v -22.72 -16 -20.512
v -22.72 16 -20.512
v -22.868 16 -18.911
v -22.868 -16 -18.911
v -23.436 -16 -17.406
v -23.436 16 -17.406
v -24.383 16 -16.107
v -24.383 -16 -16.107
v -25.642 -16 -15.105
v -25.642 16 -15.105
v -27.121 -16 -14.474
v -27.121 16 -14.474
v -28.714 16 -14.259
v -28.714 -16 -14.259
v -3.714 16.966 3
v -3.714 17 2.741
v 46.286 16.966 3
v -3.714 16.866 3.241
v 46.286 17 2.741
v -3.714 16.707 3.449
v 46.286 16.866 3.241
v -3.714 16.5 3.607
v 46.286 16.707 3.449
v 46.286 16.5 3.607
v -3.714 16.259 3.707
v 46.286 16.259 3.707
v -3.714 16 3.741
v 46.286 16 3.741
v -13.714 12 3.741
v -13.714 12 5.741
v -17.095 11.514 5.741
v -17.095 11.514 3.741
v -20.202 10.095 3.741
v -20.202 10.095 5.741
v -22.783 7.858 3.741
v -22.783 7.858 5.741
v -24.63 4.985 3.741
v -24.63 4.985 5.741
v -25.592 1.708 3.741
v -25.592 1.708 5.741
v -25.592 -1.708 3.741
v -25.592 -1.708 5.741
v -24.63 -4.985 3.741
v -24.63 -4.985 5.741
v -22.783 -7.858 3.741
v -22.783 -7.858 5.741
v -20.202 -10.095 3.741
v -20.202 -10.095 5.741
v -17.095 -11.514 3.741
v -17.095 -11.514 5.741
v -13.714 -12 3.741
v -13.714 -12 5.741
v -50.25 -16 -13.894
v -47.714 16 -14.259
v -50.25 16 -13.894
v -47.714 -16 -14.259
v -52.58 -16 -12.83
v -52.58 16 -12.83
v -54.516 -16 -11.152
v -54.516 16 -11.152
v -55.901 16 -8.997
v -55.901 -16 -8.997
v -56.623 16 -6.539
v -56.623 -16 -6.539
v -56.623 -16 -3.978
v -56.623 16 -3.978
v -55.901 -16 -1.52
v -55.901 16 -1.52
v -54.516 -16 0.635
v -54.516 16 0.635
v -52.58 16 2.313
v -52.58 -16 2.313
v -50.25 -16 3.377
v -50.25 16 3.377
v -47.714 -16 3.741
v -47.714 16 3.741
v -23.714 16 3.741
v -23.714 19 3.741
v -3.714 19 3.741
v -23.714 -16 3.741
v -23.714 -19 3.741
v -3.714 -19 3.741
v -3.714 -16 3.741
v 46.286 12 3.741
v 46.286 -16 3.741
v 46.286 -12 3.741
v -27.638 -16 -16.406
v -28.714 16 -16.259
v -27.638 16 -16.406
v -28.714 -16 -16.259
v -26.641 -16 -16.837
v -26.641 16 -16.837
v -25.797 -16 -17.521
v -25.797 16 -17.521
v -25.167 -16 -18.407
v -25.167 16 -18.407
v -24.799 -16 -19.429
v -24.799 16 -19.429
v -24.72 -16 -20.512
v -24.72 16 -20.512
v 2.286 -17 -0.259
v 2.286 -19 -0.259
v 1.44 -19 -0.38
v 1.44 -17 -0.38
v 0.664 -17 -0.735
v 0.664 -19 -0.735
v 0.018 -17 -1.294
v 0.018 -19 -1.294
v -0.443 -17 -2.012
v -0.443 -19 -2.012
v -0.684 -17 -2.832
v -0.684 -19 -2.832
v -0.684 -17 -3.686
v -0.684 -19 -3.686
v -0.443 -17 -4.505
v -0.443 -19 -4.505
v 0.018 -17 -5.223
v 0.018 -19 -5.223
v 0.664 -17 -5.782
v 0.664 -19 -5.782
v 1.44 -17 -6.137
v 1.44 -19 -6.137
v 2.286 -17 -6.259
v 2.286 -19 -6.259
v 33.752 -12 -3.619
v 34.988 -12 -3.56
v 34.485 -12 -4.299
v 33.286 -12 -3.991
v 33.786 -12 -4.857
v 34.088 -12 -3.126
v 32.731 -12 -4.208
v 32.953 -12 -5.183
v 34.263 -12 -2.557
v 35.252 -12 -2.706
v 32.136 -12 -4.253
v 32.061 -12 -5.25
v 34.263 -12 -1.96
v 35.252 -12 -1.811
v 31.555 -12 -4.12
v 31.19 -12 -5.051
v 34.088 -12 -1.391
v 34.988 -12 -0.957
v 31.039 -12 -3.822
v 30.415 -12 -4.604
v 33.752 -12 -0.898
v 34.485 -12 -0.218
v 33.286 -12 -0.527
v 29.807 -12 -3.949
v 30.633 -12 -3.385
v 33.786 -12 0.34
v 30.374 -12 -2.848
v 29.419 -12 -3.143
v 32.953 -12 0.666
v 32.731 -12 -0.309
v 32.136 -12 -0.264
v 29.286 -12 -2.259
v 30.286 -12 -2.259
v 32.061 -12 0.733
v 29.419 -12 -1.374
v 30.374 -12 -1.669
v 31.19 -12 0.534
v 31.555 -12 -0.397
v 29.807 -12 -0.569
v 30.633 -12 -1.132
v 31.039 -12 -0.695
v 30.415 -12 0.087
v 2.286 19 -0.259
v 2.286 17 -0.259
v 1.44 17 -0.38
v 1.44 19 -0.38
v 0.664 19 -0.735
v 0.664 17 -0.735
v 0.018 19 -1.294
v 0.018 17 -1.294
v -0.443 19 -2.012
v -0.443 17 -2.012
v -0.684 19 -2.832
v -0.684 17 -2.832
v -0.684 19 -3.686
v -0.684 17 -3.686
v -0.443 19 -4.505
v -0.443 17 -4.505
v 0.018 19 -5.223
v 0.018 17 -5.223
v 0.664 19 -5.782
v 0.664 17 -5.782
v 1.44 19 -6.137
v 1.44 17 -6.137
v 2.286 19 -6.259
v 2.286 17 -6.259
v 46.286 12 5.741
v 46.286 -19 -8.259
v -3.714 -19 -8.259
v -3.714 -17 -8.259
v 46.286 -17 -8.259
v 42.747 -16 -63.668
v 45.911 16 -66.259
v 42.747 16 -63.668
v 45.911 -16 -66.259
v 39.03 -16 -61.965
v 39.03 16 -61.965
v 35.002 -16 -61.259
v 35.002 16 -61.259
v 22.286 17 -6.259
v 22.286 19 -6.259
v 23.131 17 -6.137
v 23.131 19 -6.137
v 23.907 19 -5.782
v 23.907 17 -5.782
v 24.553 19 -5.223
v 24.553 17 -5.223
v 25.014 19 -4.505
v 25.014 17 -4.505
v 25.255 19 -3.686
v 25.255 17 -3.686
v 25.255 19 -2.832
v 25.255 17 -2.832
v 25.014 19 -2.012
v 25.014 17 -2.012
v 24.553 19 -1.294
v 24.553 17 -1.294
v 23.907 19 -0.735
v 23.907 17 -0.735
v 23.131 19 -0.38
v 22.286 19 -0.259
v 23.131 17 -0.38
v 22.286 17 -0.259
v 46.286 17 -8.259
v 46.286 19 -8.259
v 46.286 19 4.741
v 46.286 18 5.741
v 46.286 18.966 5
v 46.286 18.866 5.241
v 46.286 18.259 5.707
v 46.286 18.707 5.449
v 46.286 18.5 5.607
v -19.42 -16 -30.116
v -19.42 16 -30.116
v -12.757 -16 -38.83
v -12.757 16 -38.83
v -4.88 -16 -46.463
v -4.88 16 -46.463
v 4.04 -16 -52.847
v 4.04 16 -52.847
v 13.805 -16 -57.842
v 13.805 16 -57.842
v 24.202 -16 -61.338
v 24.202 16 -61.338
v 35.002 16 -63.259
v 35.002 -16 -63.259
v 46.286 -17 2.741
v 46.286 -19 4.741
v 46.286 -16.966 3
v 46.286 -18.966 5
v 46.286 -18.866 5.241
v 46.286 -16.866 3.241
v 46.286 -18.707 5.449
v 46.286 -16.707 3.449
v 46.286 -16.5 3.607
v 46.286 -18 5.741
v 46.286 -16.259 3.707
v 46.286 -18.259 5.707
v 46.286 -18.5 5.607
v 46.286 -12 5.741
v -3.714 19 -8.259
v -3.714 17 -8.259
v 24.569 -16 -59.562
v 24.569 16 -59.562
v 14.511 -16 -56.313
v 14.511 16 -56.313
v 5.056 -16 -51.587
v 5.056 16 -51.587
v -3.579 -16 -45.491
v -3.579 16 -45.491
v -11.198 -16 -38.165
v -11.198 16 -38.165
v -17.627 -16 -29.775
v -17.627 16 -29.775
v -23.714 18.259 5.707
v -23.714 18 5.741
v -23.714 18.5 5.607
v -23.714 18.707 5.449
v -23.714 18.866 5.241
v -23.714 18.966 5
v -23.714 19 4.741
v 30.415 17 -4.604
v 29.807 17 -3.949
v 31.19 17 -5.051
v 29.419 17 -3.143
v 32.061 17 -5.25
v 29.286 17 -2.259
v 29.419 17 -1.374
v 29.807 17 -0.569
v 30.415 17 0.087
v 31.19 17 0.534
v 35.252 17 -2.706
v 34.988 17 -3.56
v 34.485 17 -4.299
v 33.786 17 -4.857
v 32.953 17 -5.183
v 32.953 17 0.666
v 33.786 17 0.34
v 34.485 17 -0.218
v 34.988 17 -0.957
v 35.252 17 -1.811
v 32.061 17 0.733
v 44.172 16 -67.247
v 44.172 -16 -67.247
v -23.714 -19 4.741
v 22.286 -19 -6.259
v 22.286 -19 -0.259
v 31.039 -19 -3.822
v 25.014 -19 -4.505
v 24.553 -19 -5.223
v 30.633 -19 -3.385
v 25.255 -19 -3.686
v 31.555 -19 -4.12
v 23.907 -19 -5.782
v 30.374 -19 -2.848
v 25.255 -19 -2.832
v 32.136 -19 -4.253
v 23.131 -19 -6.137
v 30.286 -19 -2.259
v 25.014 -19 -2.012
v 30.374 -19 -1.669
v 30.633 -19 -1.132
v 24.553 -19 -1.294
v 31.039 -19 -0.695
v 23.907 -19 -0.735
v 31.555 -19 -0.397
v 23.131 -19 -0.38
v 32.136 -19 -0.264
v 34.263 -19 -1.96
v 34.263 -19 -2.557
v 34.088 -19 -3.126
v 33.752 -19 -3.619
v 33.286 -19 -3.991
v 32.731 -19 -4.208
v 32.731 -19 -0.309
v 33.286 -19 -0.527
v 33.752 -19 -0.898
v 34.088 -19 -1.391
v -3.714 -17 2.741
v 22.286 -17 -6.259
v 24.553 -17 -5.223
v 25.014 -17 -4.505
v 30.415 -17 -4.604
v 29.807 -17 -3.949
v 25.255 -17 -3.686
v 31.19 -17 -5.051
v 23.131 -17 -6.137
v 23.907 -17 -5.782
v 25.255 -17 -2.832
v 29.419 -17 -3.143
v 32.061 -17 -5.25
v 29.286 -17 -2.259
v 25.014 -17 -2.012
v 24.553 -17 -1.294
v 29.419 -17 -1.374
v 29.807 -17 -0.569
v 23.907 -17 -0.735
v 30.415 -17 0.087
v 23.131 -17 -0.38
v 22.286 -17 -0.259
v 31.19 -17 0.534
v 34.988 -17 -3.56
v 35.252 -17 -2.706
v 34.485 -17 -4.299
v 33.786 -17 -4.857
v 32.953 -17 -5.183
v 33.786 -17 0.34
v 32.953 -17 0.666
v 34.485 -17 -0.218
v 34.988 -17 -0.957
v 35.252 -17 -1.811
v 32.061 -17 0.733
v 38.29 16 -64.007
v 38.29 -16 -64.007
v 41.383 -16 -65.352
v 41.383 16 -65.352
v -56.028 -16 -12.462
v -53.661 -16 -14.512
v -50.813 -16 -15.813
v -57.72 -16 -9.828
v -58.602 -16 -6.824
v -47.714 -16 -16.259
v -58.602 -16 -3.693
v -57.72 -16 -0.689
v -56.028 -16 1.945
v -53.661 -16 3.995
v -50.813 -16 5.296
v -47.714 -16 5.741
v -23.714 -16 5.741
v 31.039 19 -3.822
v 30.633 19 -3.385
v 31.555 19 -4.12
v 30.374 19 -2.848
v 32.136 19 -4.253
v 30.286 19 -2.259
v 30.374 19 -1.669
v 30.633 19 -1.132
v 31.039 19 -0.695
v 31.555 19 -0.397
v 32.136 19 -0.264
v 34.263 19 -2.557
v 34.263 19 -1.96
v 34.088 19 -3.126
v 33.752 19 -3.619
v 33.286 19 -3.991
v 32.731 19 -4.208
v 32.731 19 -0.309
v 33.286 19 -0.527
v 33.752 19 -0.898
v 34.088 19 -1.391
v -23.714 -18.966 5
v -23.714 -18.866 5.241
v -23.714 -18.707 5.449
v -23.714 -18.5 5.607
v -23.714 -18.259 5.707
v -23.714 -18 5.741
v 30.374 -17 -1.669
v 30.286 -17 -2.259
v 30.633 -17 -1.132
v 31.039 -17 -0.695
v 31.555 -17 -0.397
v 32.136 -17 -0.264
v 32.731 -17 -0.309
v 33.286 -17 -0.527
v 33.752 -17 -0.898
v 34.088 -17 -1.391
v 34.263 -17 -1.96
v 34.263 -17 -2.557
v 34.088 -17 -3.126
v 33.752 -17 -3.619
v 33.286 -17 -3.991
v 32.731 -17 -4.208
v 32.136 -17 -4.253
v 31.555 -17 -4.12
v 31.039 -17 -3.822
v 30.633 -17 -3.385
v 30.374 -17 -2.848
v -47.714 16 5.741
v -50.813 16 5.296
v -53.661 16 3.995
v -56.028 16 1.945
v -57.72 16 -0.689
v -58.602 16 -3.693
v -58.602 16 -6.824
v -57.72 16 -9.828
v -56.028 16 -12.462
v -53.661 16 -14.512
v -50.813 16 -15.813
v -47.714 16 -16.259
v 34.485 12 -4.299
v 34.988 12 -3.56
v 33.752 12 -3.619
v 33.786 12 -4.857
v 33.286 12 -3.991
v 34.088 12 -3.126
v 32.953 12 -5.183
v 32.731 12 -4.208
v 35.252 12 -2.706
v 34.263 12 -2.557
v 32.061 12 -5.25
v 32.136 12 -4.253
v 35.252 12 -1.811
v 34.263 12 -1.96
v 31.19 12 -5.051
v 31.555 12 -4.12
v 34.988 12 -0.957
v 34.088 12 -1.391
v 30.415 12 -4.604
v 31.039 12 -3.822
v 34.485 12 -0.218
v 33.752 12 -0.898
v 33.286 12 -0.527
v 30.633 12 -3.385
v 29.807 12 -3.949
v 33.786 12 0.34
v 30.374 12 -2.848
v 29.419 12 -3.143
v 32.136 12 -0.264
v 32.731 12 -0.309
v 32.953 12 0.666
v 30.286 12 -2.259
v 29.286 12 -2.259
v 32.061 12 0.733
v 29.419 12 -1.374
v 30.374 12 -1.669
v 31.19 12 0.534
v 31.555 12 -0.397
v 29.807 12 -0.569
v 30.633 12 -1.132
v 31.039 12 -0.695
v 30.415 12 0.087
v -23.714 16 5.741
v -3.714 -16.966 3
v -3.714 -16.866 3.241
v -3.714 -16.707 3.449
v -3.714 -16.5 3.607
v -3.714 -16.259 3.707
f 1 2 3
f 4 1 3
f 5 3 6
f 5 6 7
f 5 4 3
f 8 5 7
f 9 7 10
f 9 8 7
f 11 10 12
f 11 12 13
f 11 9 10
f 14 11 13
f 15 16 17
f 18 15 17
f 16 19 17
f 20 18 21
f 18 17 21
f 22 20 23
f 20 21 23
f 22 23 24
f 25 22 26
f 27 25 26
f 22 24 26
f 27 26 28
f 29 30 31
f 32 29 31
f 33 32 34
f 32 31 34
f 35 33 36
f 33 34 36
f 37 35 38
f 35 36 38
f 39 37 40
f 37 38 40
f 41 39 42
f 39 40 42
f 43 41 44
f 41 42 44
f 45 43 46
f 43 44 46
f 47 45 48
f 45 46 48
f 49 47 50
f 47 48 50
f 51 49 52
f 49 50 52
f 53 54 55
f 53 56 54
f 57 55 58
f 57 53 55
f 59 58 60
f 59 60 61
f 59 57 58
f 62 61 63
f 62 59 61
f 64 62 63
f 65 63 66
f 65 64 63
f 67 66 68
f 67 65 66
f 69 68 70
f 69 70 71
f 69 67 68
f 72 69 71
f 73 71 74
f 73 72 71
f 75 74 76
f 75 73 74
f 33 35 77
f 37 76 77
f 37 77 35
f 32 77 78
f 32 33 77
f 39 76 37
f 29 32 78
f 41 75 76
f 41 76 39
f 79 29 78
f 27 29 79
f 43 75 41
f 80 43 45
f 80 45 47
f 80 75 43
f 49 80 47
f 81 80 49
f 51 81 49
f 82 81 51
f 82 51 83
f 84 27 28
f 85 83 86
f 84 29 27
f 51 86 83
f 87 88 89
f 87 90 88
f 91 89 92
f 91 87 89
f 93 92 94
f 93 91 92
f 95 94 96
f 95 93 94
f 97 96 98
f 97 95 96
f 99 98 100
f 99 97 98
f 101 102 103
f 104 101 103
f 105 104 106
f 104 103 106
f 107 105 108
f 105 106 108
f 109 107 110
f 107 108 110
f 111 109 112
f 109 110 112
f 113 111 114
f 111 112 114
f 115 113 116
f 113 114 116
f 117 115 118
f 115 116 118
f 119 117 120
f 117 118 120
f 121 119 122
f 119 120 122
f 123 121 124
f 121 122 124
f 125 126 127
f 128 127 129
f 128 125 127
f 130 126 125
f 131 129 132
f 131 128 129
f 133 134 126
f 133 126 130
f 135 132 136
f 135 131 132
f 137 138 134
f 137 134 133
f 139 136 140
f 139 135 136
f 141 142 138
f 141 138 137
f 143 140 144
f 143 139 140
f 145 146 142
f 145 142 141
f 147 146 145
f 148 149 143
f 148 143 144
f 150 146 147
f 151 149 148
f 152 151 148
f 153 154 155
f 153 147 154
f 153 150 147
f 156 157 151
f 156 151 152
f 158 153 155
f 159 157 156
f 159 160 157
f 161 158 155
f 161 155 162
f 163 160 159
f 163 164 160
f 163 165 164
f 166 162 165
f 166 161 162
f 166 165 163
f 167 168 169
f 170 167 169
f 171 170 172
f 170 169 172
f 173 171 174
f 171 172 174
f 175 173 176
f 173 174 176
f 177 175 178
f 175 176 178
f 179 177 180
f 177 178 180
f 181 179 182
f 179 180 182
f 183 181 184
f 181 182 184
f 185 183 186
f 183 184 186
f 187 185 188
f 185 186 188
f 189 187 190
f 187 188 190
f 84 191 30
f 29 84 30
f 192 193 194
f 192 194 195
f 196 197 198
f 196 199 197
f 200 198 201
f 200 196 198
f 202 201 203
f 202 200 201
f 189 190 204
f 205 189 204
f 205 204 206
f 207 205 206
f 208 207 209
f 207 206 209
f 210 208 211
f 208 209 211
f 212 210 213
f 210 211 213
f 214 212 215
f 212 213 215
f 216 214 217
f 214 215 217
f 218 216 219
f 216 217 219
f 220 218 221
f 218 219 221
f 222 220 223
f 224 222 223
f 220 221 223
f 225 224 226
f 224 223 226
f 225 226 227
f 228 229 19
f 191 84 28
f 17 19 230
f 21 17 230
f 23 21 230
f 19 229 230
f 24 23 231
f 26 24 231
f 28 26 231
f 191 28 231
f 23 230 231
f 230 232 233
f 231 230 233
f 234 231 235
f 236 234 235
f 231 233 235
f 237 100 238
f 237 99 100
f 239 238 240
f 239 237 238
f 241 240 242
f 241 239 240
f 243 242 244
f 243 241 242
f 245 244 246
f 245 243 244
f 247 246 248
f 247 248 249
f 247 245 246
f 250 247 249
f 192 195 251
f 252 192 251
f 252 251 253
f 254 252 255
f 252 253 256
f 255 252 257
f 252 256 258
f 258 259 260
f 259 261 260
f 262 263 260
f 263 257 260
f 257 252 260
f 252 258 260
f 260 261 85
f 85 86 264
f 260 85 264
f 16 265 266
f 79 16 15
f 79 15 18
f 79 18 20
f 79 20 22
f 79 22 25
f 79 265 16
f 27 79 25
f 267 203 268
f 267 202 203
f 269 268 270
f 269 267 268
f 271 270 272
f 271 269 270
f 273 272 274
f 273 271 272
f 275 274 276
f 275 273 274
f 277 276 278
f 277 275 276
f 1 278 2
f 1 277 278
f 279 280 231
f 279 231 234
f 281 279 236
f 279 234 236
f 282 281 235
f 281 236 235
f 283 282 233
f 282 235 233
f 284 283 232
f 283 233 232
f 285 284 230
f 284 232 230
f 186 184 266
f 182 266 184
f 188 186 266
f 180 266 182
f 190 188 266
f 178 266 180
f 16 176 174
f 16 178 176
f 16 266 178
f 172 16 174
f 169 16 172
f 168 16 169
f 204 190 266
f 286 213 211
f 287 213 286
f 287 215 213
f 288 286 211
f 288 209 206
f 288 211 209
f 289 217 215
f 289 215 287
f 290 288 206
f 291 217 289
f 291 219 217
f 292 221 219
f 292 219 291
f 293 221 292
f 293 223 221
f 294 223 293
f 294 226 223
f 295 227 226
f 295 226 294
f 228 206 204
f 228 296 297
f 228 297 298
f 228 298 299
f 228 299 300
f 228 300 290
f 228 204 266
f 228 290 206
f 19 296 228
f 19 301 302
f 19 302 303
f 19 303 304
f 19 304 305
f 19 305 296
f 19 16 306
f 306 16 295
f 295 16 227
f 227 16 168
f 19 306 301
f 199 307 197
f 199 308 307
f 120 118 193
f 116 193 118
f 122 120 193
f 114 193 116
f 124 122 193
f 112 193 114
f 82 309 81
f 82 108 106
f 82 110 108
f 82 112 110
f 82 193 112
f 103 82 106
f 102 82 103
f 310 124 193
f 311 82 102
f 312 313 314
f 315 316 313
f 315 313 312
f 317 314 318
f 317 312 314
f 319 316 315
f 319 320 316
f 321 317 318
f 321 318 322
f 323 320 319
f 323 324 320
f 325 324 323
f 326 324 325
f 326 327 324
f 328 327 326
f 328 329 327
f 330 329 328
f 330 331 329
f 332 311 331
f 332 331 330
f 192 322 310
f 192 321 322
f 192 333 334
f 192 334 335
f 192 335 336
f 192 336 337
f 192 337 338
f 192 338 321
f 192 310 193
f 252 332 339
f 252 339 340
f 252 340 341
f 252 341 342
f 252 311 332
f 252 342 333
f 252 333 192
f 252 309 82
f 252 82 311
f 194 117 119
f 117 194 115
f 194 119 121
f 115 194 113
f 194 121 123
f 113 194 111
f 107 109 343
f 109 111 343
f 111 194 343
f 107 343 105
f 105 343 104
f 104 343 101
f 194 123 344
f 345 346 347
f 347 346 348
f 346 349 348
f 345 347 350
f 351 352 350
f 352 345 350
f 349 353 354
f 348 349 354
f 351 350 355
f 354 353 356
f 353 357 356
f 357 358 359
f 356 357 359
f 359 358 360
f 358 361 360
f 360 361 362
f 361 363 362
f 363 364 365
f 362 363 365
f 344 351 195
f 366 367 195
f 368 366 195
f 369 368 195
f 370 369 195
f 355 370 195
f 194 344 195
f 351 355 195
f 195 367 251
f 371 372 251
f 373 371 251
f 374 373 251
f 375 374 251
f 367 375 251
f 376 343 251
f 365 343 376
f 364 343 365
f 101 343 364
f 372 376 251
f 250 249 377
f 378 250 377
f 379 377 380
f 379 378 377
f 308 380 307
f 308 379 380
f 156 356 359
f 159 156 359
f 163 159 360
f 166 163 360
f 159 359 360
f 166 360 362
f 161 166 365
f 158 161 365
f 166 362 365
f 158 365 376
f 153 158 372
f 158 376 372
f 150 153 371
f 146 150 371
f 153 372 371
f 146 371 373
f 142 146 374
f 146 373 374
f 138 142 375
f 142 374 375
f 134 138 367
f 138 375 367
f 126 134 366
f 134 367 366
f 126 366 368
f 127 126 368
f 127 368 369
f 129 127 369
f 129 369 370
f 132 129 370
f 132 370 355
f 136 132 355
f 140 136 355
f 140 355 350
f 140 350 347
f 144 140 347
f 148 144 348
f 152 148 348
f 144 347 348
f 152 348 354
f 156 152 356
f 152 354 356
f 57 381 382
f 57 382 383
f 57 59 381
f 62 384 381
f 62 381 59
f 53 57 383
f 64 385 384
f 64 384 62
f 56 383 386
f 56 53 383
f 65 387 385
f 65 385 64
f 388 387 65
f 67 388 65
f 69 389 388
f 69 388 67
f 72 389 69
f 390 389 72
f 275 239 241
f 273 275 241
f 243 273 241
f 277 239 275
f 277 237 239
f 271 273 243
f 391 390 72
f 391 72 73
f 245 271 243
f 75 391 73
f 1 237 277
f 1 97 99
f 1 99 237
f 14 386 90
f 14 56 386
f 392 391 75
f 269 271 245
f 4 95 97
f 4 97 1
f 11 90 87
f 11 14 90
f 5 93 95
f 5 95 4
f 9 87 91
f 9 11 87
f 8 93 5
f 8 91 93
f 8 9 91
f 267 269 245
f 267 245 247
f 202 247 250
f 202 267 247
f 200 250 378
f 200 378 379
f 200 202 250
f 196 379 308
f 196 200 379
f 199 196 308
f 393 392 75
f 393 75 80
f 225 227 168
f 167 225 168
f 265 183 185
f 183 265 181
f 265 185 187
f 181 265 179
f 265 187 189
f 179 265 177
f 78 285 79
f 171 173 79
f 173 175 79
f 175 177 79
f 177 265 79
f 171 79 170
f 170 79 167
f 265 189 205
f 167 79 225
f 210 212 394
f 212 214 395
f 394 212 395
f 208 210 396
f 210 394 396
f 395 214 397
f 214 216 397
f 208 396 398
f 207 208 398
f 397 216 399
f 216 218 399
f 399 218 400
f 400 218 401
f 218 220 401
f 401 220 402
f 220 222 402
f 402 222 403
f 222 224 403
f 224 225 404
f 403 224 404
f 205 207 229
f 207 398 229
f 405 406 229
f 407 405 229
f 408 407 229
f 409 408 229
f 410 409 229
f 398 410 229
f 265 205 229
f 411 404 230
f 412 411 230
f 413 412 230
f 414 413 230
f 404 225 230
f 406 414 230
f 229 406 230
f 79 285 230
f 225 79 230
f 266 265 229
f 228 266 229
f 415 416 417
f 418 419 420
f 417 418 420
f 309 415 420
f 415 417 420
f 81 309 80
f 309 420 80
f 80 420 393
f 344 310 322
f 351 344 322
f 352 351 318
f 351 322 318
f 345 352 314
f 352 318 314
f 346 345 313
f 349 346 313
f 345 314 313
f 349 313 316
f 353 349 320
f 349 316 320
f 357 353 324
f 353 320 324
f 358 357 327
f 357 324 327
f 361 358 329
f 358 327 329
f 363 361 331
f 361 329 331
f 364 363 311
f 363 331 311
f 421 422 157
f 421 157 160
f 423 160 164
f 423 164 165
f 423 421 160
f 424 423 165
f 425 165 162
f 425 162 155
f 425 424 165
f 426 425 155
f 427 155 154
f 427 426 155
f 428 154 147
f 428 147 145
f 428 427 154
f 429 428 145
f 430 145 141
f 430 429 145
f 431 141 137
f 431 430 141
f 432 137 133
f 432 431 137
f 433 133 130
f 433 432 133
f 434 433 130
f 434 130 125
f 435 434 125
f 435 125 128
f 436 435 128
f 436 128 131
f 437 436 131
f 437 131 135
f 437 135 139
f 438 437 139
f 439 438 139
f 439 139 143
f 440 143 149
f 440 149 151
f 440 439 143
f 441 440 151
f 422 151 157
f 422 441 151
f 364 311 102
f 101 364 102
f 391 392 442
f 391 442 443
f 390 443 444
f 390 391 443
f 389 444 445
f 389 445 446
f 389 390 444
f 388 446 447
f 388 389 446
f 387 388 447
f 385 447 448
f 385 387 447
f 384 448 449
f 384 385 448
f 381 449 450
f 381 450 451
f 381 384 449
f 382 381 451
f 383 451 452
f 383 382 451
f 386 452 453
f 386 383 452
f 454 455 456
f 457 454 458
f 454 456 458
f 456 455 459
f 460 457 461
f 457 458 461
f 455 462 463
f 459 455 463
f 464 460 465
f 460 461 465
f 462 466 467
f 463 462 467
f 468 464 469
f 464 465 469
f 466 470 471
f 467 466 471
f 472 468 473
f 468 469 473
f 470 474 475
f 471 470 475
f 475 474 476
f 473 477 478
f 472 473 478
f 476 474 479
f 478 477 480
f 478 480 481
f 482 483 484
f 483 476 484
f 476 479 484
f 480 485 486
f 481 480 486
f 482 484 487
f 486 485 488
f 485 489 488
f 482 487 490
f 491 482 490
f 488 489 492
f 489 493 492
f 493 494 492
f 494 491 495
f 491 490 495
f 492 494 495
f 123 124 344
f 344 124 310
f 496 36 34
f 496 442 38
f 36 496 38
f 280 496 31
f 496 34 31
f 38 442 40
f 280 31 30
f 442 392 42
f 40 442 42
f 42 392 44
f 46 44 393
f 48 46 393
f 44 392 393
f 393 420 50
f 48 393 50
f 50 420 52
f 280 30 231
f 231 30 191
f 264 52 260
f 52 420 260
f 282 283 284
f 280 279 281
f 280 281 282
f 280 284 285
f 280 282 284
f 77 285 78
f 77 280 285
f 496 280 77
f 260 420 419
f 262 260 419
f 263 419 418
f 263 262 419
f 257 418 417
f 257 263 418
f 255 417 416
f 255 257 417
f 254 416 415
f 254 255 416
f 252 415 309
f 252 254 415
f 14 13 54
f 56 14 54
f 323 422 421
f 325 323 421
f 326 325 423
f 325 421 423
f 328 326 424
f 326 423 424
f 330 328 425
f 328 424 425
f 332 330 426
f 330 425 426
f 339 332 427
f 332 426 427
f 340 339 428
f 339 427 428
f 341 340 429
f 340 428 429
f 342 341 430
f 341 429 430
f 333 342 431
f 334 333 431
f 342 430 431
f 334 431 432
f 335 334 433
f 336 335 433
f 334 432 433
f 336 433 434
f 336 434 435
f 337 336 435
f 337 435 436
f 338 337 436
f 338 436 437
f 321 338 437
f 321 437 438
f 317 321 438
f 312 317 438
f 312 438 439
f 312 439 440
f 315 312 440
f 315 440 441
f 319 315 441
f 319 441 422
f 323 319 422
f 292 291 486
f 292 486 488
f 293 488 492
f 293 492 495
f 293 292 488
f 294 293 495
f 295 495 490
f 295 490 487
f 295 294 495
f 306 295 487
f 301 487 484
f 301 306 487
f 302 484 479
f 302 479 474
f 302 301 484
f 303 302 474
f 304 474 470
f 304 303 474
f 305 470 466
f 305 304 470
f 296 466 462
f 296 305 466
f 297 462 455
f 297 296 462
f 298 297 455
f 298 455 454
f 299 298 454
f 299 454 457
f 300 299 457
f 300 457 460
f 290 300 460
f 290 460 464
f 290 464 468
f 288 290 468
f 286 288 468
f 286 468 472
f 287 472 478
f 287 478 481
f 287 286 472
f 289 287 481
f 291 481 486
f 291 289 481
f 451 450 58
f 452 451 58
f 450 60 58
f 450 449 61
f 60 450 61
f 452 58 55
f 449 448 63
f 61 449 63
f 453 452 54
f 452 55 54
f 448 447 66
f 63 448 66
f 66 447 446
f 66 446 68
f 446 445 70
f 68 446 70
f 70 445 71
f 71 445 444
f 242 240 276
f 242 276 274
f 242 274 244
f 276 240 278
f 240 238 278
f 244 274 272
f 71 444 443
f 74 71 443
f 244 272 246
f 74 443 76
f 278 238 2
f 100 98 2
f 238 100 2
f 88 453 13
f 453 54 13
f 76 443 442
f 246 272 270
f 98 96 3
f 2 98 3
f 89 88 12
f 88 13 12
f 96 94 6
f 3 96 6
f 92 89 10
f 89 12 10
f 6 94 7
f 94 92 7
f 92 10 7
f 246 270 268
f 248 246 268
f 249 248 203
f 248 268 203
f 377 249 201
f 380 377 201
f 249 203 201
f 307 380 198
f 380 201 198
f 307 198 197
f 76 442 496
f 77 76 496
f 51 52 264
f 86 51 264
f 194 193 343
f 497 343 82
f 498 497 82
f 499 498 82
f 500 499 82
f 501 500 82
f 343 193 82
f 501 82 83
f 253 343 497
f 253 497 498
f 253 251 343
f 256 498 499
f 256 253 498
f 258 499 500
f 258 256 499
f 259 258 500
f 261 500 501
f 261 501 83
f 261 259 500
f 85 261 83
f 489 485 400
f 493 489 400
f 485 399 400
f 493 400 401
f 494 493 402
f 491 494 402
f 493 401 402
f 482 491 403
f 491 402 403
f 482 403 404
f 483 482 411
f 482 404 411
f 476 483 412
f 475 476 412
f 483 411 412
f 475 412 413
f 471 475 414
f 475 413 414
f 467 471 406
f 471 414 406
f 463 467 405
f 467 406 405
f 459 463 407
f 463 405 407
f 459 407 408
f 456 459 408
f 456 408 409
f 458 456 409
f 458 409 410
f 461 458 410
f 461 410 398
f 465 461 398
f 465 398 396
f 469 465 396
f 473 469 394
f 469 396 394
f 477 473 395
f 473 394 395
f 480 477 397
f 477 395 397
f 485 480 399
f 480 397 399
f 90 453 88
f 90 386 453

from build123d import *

# Parameters (mm, degrees)
F1_DEPTH  = 16
F2_W      = 70
F2_H      = 3
F3_DEPTH  = 2
F4_W      = 50
F4_H      = 12
F5_DEPTH  = 2
F6_R      = 1
F9_DEPTH  = 2
F11_DEPTH = 38.001
F13_D     = 4
F14_R     = 3
F14_R_2   = 2
F15_DEPTH = 5


# Not quite as in the source:
# - a pattern or mirror of a feature is missing from the dataset's text; its kind, count and spacing are read off the source's solid


with BuildPart() as f1:
    # F0 (on Front) → F1 (new body)
    with BuildSketch(Plane.XZ):
        with BuildLine():
            Line((46.2855722755, 5.7414249778), (-47.7144277245, 5.7414249778))
            ThreePointArc((-47.7144277245, 5.7414249778), (-58.7144277245, -5.2585750222), (-47.7144277245, -16.2585750222))
            Line((-47.7144277245, -16.2585750222), (-28.7144277245, -16.2585750222))
            ThreePointArc((-28.7144277245, -16.2585750222), (-25.7968307423, -17.5210599177), (-24.7197856057, -20.5120821569))
            ThreePointArc((-24.7197856057, -20.5120821569), (-0.5386319719, -49.8206199667), (35.0020481502, -63.2585750222))
            ThreePointArc((35.0020481502, -63.2585750222), (39.8678360266, -64.6074545818), (44.1721712505, -67.2471640366))
            Line((44.1721712505, -67.2471640366), (45.9107602648, -66.2585750222))
            ThreePointArc((45.9107602648, -66.2585750222), (40.9429054682, -62.6971545828), (35.0020481502, -61.2585750222))
            ThreePointArc((35.0020481502, -61.2585750222), (0.6230450398, -48.7022972109), (-22.7197856057, -20.5120821569))
            ThreePointArc((-22.7197856057, -20.5120821569), (-24.3830859689, -16.1065299122), (-28.7144277245, -14.2585750222))
            Line((-28.7144277245, -14.2585750222), (-47.7144277245, -14.2585750222))
            ThreePointArc((-47.7144277245, -14.2585750222), (-56.7144277245, -5.2585750222), (-47.7144277245, 3.7414249778))
            Line((-47.7144277245, 3.7414249778), (46.2855722755, 3.7414249778))
            Line((46.2855722755, 3.7414249778), (46.2855722755, 5.7414249778))
        make_face()
    extrude(amount=F1_DEPTH)

    # F2 (on face) → F3 (join)
    with BuildSketch(Plane.XY.offset(5.7414249778)):
        with Locations((11.2855722755, -17.5)):
            Rectangle(F2_W, F2_H)
    extrude(amount=-F3_DEPTH)

    # F4 (on face) → F5 (join)
    with BuildSketch(Plane.XZ.offset(19)):
        with Locations((21.2855722755, -2.2585750222)):
            Rectangle(F4_W, F4_H)
    extrude(amount=-F5_DEPTH)

    # F6
    f6_edges = [f1.edges().sort_by_distance(p)[0] for p in [
        (11.285572, -19, 5.741425),
        (21.285572, -17, 3.741425),
    ]]
    fillet(f6_edges, radius=F6_R)

    # F7: F1 across plane


with BuildPart() as f1_1:
    add(f1.part)
    add(f1.part.mirror(Plane.XZ))

    # F8 (on face) → F9 (cut)
    with BuildSketch(Plane.XY.offset(5.7414249778)):
        with BuildLine():
            Line((46.2855722755, 12), (-13.7144277245, 12))
            ThreePointArc((-13.7144277245, 12), (-25.7144277245, 0), (-13.7144277245, -12))
            Line((-13.7144277245, -12), (46.2855722755, -12))
            Line((46.2855722755, -12), (46.2855722755, 12))
        make_face()
    extrude(amount=-F9_DEPTH, mode=Mode.SUBTRACT)

    # F10 (on face) → F11 (cut, through all)
    with BuildSketch(Plane.XZ.offset(19)):
        with BuildLine():
            ThreePointArc((2.2855722755, -0.2585750222), (-0.7144277245, -3.2585750222), (2.2855722755, -6.2585750222))
            Line((2.2855722755, -6.2585750222), (22.2855722755, -6.2585750222))
            ThreePointArc((22.2855722755, -6.2585750222), (25.2855722755, -3.2585750222), (22.2855722755, -0.2585750222))
            Line((22.2855722755, -0.2585750222), (2.2855722755, -0.2585750222))
        make_face()
    extrude(amount=-F11_DEPTH, mode=Mode.SUBTRACT)

    # F13 (through all)
    with Locations(Plane.XZ.offset(19)):
        with Locations((32.2855722755, -2.2585750222)):
            Hole(F13_D / 2)

    # F14 (on face) → F15 (join)
    with BuildSketch(Plane(origin=(0, -17, 0), x_dir=(-1, 0, 0), z_dir=(0, 1, 0))):
        with Locations((-32.2855722755, -2.2585750222)):
            Circle(F14_R)
        with Locations((-32.2855722755, -2.2585750222)):
            Circle(F14_R_2, mode=Mode.SUBTRACT)
    f15 = extrude(amount=F15_DEPTH)

    # F15_copies: F15 across plane
    add(f15.mirror(Plane.ZX))


solid = f1_1.part
